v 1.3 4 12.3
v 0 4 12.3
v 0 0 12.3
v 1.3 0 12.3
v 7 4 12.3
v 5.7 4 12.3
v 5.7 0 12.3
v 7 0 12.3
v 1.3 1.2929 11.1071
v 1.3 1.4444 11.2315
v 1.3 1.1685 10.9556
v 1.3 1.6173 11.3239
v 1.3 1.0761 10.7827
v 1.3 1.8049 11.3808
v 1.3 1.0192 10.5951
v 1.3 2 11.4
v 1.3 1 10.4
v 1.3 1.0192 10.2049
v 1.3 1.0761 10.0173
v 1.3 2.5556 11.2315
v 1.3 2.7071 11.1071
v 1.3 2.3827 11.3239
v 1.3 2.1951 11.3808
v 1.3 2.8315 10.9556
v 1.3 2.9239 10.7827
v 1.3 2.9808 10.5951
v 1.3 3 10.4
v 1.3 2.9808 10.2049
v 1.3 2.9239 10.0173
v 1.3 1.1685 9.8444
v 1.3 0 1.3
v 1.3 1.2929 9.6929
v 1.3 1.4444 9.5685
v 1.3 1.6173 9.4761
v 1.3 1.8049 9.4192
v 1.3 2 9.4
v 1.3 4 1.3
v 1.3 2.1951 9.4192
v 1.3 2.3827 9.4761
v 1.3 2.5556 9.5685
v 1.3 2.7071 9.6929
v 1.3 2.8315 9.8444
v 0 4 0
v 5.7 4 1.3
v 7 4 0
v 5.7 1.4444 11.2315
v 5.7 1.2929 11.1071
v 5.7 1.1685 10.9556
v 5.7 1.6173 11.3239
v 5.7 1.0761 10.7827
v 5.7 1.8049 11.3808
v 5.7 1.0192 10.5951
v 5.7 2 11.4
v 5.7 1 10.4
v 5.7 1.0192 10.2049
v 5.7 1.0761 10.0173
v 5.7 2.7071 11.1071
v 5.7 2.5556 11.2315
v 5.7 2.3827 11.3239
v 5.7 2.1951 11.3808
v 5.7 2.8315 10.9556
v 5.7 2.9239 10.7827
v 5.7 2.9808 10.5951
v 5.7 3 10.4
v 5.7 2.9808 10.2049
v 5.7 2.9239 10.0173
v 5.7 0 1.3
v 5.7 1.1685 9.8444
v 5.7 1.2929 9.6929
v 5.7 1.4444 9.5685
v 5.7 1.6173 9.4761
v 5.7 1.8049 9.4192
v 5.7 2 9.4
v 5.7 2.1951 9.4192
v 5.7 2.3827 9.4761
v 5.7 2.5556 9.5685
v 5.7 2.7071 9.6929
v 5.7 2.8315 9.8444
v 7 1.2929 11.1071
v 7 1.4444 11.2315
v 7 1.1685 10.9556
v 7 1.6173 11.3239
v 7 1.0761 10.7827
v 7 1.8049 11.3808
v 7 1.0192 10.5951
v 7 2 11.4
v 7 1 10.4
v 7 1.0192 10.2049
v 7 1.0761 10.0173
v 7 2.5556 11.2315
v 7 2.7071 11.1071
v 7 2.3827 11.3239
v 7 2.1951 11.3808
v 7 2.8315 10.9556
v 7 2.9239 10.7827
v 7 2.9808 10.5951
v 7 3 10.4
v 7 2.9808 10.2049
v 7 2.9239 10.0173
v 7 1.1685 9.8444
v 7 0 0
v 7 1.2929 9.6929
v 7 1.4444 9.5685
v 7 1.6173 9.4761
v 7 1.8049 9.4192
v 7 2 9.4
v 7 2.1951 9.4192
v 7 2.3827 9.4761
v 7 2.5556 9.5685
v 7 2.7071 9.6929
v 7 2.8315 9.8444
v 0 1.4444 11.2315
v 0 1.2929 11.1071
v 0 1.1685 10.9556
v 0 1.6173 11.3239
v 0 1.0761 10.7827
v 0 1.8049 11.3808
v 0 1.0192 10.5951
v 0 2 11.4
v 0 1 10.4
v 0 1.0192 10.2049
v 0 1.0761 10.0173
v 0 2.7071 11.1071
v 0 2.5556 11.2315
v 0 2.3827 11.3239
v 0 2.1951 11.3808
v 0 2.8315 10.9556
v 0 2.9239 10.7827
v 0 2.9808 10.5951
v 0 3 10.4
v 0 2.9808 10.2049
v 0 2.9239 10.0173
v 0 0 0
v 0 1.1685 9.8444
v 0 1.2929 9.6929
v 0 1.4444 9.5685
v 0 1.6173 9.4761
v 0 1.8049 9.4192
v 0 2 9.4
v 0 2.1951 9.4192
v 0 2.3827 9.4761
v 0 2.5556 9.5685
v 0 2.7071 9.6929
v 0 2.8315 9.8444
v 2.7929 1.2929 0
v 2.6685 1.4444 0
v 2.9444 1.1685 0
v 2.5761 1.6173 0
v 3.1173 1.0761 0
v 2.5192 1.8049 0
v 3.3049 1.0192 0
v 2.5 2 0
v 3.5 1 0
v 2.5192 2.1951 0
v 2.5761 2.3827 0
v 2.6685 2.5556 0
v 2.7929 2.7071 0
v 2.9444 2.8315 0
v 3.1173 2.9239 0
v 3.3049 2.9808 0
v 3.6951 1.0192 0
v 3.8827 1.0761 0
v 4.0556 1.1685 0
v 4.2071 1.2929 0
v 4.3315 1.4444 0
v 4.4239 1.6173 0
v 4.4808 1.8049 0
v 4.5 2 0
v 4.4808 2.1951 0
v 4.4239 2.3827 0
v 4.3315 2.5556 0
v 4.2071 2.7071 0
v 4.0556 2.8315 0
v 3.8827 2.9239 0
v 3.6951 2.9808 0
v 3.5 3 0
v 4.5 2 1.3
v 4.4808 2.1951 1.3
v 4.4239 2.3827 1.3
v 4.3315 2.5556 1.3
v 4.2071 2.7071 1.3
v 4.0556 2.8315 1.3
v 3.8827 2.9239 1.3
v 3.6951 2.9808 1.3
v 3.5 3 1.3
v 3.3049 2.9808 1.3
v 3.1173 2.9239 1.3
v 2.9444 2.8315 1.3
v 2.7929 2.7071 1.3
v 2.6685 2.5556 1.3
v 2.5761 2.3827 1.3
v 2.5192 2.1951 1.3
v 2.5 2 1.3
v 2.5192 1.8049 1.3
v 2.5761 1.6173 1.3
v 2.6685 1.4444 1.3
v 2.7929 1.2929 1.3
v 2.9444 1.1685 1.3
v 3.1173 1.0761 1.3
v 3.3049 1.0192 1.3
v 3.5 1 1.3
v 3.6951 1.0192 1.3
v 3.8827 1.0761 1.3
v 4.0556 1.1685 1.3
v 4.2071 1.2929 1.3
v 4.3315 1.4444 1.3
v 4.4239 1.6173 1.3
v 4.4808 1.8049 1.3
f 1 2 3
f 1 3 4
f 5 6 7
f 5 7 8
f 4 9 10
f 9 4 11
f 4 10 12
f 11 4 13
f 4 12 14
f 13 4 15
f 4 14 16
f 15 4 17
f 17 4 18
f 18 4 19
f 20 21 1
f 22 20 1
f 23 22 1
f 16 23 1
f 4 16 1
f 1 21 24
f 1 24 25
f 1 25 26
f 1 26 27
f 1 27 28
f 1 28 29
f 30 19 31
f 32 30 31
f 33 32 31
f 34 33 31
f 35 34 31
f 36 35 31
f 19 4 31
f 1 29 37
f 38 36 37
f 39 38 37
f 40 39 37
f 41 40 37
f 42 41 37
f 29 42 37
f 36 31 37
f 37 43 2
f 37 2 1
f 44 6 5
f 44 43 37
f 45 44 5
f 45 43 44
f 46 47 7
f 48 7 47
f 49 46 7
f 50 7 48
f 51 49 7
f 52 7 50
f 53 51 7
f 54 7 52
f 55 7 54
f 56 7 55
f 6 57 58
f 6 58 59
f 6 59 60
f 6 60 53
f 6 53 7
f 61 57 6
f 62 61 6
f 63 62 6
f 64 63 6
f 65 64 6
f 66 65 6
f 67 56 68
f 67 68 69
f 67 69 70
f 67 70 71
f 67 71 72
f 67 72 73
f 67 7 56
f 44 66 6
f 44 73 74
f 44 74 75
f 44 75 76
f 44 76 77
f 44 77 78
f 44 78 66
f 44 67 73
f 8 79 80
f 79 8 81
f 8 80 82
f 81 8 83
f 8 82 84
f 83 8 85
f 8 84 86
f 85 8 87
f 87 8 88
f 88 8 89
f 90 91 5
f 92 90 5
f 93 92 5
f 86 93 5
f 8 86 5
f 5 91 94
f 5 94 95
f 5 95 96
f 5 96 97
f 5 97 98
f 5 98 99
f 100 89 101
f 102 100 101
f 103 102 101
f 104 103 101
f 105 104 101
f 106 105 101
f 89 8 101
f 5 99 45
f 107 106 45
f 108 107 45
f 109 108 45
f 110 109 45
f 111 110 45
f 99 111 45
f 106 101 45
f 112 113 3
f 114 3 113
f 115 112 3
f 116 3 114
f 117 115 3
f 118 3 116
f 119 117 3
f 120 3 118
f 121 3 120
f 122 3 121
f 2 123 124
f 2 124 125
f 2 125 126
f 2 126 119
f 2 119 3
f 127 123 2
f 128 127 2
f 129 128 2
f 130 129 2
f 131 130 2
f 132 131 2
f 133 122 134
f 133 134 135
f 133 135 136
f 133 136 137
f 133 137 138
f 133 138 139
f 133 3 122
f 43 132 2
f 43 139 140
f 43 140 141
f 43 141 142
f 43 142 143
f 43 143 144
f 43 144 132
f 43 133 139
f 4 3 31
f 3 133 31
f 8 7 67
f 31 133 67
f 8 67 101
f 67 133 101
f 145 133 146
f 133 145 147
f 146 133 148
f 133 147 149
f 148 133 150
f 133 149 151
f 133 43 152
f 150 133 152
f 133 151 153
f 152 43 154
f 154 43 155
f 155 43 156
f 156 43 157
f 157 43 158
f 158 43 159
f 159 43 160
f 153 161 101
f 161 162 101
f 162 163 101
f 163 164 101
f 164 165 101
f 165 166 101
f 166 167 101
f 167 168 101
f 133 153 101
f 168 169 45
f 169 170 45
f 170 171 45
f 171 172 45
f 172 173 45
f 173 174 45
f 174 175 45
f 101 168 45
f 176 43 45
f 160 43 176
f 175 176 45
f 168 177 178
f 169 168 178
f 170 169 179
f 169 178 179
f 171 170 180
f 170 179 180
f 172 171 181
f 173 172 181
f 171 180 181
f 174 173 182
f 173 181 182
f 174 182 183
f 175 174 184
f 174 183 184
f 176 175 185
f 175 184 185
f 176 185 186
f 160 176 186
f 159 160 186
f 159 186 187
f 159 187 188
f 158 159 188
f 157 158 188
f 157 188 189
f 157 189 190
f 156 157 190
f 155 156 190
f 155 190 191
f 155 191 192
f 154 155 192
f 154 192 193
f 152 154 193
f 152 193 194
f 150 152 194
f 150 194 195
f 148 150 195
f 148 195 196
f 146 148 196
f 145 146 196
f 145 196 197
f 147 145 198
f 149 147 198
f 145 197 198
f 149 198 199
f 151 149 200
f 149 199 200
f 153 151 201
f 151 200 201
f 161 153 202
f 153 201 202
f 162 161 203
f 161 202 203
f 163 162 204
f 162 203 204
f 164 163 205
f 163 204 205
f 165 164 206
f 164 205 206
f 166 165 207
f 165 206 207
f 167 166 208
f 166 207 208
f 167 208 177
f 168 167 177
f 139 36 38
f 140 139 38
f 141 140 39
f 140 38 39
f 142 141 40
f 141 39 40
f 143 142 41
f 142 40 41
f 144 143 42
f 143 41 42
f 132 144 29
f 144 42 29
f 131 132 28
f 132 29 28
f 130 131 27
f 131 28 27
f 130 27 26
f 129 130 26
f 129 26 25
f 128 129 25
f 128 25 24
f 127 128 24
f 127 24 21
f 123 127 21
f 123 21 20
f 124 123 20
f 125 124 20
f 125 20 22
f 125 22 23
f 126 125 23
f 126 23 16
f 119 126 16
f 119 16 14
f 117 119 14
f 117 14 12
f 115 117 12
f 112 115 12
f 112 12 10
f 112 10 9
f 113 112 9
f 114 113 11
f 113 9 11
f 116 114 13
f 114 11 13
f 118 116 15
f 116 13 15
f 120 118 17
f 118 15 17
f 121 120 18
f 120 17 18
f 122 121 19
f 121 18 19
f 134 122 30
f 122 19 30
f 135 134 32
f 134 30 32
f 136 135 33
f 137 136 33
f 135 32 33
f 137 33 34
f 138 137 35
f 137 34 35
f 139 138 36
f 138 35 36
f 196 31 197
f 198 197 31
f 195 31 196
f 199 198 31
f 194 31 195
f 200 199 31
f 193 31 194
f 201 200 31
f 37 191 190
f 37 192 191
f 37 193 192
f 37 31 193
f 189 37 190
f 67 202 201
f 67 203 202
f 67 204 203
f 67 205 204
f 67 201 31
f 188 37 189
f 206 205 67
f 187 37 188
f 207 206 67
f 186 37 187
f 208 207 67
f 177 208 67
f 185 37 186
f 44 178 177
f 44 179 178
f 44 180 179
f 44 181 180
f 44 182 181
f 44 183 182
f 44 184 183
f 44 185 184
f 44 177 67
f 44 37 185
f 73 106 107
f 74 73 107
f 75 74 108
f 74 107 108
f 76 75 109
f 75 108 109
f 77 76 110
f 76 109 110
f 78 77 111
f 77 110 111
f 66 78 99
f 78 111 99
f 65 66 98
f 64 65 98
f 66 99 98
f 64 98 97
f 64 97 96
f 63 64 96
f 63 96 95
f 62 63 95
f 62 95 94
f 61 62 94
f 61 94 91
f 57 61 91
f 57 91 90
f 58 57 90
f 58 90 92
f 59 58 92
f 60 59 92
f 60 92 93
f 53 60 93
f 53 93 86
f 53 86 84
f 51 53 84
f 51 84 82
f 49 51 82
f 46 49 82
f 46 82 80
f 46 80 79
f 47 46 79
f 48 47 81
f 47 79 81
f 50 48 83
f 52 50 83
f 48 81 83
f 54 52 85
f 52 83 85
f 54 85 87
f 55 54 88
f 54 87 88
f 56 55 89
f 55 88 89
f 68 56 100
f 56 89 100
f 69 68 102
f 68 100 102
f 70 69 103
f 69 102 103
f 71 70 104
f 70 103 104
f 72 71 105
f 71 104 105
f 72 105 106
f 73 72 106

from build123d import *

# Parameters (mm, degrees)
SKETCH_1_W          = 7
SKETCH_1_H          = 4
EXTRUDE_1_DEPTH     = 1.3
SKETCH_2_W          = 1.3
SKETCH_2_H          = 4
EXTRUDE_2_DEPTH     = 11
SKETCH_3_R          = 1
CUT_EXTRUDE_1_DEPTH = 2
SKETCH_4_R          = 1
CUT_EXTRUDE_2_DEPTH = 7


with BuildPart() as part:
    # 草图1 → 凸台-拉伸1 (new body)
    with BuildSketch(Plane.XY):
        with Locations((3.5, 2)):
            Rectangle(SKETCH_1_W, SKETCH_1_H)
    extrude(amount=EXTRUDE_1_DEPTH)

    # 草图2 → 凸台-拉伸2 (add)
    with BuildSketch(Plane.XY.offset(1.3)):
        with Locations((0.65, 2)):
            Rectangle(SKETCH_2_W, SKETCH_2_H)
        with Locations((6.35, 2)):
            Rectangle(SKETCH_2_W, SKETCH_2_H)
    extrude(amount=EXTRUDE_2_DEPTH)

    # 草图3 → 切除-拉伸1 (cut)
    with BuildSketch(Plane.XY.offset(1.3)):
        with Locations((3.5, 2)):
            Circle(SKETCH_3_R)
    extrude(amount=-CUT_EXTRUDE_1_DEPTH, mode=Mode.SUBTRACT)

    # 草图4 → 切除-拉伸2 (cut)
    with BuildSketch(Plane(origin=(7, 0, 0), x_dir=(0, 0, -1), z_dir=(1, 0, 0))):
        with Locations((-10.4, 2)):
            Circle(SKETCH_4_R)
    extrude(amount=-CUT_EXTRUDE_2_DEPTH, mode=Mode.SUBTRACT)


solid = part.part
